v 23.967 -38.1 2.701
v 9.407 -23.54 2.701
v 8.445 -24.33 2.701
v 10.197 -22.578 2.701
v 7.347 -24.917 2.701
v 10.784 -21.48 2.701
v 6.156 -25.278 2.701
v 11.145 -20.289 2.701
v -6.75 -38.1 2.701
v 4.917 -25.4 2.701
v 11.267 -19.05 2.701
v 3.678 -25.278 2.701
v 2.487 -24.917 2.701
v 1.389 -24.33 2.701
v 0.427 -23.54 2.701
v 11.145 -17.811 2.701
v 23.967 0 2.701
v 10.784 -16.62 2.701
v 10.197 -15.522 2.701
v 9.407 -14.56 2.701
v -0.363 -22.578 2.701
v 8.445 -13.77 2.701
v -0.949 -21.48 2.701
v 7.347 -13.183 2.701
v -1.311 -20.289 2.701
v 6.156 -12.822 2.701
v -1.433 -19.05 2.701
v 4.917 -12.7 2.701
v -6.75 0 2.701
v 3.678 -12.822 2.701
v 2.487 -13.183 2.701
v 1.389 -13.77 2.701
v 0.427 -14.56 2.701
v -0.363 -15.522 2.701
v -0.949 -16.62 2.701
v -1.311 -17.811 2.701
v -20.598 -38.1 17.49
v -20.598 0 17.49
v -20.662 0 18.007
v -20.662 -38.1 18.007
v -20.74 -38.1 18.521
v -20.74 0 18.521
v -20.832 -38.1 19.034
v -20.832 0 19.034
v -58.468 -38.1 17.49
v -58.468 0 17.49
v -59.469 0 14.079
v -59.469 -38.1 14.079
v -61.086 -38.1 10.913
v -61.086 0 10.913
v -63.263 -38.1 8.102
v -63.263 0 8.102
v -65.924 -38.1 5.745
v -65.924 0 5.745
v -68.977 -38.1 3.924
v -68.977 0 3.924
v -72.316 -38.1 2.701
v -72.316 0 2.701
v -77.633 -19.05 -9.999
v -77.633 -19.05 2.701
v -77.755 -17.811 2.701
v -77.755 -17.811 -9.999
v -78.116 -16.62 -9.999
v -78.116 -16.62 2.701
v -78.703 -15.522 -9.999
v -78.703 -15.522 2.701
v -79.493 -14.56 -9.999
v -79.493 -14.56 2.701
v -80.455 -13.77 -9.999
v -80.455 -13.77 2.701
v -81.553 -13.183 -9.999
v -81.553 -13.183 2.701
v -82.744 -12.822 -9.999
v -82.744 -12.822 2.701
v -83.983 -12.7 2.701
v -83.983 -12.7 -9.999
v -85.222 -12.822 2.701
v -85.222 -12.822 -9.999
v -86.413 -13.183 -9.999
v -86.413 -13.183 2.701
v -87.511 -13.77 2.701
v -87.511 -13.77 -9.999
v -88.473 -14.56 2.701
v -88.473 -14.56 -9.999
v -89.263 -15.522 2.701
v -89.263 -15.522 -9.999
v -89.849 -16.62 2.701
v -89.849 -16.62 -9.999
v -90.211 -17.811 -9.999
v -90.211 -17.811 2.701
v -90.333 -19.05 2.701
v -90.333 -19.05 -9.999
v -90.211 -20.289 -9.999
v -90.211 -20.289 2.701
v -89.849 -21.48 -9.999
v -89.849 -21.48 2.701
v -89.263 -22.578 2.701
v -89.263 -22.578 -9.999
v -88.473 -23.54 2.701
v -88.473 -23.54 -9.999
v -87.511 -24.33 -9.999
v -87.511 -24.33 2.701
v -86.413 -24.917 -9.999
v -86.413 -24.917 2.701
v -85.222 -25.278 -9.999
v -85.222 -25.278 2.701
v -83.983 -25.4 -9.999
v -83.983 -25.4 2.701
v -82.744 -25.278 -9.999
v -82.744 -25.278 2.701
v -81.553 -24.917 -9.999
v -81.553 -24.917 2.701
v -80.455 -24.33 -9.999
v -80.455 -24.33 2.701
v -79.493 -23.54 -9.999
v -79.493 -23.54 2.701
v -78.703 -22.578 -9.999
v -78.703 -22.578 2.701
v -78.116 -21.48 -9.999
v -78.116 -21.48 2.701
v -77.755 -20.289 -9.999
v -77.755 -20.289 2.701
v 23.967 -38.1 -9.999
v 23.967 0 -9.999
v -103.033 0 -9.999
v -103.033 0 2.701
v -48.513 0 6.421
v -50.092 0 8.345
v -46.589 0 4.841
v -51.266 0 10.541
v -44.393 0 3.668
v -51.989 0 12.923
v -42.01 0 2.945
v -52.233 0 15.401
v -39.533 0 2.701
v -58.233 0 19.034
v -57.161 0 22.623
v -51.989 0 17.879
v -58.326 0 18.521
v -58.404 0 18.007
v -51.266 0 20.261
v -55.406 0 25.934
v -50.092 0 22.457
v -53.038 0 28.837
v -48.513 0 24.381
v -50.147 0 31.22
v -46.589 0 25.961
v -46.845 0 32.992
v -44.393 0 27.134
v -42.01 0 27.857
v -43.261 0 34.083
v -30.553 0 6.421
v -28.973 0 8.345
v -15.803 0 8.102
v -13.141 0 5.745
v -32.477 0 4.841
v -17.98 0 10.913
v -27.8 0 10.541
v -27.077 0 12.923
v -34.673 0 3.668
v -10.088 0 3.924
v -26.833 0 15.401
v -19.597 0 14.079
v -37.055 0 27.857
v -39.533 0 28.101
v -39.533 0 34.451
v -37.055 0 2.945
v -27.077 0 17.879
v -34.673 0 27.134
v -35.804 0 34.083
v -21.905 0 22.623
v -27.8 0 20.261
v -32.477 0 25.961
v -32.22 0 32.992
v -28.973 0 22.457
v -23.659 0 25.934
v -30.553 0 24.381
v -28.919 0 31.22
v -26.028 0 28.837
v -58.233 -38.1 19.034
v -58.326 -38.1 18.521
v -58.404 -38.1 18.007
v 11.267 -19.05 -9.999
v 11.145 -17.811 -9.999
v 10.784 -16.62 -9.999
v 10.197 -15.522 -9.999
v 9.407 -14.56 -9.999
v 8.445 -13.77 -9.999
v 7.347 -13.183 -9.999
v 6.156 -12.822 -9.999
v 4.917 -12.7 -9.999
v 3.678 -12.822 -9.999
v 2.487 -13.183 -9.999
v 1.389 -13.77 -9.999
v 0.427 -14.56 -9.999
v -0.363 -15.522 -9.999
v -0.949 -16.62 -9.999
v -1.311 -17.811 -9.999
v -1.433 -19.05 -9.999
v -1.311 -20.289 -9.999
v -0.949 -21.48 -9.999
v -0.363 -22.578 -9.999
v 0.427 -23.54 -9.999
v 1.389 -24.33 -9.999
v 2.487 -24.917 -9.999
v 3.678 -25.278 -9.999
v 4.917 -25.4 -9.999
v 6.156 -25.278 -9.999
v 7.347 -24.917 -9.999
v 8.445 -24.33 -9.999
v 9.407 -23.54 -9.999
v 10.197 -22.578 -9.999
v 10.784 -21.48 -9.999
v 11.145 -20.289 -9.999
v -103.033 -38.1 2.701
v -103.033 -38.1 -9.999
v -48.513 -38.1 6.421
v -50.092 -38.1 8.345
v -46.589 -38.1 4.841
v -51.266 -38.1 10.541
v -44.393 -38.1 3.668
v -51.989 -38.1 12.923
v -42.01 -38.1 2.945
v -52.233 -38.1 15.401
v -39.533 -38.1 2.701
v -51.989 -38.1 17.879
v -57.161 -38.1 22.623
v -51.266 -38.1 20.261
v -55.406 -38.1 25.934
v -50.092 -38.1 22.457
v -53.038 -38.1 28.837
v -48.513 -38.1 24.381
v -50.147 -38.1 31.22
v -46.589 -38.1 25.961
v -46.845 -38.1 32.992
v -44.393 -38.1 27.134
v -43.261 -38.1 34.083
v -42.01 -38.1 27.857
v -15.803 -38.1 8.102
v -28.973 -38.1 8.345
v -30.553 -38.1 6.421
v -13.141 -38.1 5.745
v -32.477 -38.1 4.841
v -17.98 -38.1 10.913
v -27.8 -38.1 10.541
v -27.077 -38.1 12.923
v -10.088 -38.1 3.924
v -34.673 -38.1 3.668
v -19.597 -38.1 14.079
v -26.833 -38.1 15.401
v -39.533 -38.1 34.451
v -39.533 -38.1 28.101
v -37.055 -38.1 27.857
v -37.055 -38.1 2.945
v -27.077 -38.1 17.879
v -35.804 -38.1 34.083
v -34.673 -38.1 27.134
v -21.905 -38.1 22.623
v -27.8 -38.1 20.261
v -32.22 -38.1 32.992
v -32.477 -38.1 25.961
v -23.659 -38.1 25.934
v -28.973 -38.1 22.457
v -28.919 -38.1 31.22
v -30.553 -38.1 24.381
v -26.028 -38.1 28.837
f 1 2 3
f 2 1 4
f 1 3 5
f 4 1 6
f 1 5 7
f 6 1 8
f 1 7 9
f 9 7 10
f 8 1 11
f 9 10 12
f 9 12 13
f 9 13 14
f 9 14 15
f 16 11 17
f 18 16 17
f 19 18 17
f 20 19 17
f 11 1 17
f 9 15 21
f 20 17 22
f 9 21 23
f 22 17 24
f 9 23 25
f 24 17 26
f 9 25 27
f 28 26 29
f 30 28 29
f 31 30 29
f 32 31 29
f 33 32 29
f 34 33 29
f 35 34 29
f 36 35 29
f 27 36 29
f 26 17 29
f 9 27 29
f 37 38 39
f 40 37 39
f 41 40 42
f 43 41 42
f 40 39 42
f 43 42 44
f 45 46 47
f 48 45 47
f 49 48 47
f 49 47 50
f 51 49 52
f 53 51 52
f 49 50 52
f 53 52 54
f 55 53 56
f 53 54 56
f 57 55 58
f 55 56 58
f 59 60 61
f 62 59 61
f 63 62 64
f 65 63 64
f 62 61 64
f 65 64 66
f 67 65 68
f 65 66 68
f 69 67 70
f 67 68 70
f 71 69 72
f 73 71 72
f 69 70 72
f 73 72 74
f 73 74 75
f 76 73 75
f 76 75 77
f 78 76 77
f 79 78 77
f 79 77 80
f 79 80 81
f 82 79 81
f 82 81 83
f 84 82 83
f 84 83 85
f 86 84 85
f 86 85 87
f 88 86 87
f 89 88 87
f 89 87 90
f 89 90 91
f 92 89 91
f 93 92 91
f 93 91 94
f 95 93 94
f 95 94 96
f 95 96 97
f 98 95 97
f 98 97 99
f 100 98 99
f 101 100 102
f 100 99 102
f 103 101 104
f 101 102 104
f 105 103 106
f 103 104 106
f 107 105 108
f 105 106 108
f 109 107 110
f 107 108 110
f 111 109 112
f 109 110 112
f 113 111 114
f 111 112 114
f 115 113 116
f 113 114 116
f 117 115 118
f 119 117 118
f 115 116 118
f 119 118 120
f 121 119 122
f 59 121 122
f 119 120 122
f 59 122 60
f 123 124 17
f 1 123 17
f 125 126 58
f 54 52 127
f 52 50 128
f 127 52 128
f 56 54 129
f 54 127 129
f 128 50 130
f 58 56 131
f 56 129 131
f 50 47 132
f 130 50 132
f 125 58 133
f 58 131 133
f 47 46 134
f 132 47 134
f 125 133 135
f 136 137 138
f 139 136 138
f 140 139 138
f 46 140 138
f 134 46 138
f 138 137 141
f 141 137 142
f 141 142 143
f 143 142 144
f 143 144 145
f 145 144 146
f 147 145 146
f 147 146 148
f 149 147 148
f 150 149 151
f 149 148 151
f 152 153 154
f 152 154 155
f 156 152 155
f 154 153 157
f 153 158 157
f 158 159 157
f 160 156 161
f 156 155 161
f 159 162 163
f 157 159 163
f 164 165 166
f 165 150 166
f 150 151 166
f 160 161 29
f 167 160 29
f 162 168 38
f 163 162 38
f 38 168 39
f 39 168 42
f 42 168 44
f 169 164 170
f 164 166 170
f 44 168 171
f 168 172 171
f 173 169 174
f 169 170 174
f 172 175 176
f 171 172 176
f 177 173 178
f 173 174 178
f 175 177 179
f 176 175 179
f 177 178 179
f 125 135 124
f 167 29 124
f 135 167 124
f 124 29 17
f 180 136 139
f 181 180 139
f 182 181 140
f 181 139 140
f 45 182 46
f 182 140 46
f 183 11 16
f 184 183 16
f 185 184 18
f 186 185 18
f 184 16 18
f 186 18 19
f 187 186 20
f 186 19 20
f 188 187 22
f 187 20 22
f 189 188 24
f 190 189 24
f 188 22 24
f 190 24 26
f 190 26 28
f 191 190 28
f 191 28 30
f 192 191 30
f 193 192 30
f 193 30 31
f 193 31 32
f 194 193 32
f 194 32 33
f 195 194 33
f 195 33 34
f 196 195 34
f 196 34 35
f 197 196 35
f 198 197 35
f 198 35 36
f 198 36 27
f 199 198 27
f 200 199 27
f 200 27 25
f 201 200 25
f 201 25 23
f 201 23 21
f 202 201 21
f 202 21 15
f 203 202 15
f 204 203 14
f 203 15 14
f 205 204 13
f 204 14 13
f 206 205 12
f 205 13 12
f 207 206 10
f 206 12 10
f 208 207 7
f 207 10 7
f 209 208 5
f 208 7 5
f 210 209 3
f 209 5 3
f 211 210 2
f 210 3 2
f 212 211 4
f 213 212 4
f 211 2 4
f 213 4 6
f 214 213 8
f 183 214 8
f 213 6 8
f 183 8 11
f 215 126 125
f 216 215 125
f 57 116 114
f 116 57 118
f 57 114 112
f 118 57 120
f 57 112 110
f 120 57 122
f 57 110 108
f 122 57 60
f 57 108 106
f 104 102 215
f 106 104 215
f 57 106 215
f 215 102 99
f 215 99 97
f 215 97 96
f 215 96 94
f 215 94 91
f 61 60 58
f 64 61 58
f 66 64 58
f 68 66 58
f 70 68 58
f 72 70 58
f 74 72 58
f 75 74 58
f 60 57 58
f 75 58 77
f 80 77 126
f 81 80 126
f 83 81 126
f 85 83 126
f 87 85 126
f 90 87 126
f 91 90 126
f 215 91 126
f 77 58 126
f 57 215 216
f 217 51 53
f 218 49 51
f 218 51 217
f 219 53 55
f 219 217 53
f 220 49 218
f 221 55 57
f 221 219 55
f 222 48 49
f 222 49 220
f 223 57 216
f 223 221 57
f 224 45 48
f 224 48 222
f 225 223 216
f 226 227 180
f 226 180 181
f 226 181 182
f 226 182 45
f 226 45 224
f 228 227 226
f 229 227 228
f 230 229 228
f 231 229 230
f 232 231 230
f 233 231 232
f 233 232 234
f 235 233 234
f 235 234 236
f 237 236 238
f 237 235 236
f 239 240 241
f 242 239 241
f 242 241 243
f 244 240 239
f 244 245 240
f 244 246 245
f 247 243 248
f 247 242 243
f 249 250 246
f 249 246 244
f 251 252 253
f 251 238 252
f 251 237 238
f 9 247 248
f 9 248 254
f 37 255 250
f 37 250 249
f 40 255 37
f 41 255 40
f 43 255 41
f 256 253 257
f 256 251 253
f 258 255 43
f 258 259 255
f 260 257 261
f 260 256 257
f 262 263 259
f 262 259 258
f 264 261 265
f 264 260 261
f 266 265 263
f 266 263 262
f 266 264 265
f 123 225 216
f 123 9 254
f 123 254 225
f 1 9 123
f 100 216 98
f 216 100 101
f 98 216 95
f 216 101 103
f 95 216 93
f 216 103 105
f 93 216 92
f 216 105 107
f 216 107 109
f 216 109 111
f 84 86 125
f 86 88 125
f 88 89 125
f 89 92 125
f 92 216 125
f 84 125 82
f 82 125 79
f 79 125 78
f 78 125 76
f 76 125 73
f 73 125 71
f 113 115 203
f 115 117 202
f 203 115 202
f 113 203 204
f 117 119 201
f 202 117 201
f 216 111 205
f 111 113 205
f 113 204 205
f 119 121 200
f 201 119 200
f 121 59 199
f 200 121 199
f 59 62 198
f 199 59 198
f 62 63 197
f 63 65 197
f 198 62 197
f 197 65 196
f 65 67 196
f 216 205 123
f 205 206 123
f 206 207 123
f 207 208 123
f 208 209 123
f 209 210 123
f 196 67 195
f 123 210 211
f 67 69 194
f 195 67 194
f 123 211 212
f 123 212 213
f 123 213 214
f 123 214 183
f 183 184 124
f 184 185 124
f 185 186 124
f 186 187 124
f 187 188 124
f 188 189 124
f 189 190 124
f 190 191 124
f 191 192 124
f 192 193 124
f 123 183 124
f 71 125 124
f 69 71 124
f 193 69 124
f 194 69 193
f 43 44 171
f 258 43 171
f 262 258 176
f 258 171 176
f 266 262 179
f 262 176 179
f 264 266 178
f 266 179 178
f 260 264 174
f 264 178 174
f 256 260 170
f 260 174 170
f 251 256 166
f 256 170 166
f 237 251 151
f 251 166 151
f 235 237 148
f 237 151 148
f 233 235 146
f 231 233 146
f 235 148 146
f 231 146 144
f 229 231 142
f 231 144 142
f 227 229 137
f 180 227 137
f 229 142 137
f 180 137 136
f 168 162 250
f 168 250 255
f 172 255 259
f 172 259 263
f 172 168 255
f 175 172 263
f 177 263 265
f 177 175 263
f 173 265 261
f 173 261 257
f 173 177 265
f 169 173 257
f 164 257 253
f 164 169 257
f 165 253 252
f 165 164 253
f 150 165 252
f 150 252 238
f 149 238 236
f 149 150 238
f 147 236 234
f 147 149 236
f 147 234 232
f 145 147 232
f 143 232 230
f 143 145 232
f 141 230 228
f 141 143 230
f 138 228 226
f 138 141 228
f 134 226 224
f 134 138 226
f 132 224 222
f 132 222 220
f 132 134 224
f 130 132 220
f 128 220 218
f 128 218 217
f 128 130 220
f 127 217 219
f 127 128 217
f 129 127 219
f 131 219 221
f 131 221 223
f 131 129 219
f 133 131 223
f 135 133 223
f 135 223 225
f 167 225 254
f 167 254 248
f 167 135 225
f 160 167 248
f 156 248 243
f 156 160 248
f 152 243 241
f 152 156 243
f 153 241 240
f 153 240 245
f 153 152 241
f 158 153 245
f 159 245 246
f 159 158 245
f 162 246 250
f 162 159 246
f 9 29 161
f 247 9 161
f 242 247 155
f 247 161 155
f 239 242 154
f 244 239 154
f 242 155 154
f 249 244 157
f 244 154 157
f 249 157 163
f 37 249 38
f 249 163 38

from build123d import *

# Parameters (mm, degrees)
F0_R     = 12.7
F1_DEPTH = 38.1
F2_R     = 6.35
F3_DEPTH = 25.4


with BuildPart() as f1:
    # F0 (on Front) → F1 (new body)
    with BuildSketch(Plane.XZ):
        with BuildLine():
            Line((-103.032803, -9.998872), (23.967197, -9.998872))
            Line((23.967197, -9.998872), (23.967197, 2.701128))
            Line((23.967197, 2.701128), (-6.750105, 2.701128))
            ThreePointArc((-6.750105, 2.701128), (-15.802905, 8.10209), (-20.597679, 17.490047))
            ThreePointArc((-20.597679, 17.490047), (-20.730839, 18.259479), (-20.832355, 19.03372))
            ThreePointArc((-20.832355, 19.03372), (-39.532803, 34.451128), (-58.233251, 19.03372))
            ThreePointArc((-58.233251, 19.03372), (-58.334767, 18.259479), (-58.467927, 17.490047))
            ThreePointArc((-58.467927, 17.490047), (-63.262701, 8.10209), (-72.315501, 2.701128))
            Line((-72.315501, 2.701128), (-103.032803, 2.701128))
            Line((-103.032803, 2.701128), (-103.032803, -9.998872))
        make_face()
        with Locations((-39.532803, 15.401128)):
            Circle(F0_R, mode=Mode.SUBTRACT)
        with BuildLine():
            ThreePointArc((-20.832355, 19.03372), (-20.730839, 18.259479), (-20.597679, 17.490047))
            ThreePointArc((-20.597679, 17.490047), (-20.699195, 18.264289), (-20.832355, 19.03372))
        make_face()
        with BuildLine():
            ThreePointArc((-58.233251, 19.03372), (-58.366411, 18.264289), (-58.467927, 17.490047))
            ThreePointArc((-58.467927, 17.490047), (-58.334767, 18.259479), (-58.233251, 19.03372))
        make_face()
    extrude(amount=F1_DEPTH)

    # F2 (on face) → F3 (cut)
    with BuildSketch(Plane.XY.offset(2.701128)):
        with Locations((-83.982803, -19.05)):
            Circle(F2_R)
        with Locations((4.917197, -19.05)):
            Circle(F2_R)
    extrude(amount=-F3_DEPTH, mode=Mode.SUBTRACT)


solid = f1.part
